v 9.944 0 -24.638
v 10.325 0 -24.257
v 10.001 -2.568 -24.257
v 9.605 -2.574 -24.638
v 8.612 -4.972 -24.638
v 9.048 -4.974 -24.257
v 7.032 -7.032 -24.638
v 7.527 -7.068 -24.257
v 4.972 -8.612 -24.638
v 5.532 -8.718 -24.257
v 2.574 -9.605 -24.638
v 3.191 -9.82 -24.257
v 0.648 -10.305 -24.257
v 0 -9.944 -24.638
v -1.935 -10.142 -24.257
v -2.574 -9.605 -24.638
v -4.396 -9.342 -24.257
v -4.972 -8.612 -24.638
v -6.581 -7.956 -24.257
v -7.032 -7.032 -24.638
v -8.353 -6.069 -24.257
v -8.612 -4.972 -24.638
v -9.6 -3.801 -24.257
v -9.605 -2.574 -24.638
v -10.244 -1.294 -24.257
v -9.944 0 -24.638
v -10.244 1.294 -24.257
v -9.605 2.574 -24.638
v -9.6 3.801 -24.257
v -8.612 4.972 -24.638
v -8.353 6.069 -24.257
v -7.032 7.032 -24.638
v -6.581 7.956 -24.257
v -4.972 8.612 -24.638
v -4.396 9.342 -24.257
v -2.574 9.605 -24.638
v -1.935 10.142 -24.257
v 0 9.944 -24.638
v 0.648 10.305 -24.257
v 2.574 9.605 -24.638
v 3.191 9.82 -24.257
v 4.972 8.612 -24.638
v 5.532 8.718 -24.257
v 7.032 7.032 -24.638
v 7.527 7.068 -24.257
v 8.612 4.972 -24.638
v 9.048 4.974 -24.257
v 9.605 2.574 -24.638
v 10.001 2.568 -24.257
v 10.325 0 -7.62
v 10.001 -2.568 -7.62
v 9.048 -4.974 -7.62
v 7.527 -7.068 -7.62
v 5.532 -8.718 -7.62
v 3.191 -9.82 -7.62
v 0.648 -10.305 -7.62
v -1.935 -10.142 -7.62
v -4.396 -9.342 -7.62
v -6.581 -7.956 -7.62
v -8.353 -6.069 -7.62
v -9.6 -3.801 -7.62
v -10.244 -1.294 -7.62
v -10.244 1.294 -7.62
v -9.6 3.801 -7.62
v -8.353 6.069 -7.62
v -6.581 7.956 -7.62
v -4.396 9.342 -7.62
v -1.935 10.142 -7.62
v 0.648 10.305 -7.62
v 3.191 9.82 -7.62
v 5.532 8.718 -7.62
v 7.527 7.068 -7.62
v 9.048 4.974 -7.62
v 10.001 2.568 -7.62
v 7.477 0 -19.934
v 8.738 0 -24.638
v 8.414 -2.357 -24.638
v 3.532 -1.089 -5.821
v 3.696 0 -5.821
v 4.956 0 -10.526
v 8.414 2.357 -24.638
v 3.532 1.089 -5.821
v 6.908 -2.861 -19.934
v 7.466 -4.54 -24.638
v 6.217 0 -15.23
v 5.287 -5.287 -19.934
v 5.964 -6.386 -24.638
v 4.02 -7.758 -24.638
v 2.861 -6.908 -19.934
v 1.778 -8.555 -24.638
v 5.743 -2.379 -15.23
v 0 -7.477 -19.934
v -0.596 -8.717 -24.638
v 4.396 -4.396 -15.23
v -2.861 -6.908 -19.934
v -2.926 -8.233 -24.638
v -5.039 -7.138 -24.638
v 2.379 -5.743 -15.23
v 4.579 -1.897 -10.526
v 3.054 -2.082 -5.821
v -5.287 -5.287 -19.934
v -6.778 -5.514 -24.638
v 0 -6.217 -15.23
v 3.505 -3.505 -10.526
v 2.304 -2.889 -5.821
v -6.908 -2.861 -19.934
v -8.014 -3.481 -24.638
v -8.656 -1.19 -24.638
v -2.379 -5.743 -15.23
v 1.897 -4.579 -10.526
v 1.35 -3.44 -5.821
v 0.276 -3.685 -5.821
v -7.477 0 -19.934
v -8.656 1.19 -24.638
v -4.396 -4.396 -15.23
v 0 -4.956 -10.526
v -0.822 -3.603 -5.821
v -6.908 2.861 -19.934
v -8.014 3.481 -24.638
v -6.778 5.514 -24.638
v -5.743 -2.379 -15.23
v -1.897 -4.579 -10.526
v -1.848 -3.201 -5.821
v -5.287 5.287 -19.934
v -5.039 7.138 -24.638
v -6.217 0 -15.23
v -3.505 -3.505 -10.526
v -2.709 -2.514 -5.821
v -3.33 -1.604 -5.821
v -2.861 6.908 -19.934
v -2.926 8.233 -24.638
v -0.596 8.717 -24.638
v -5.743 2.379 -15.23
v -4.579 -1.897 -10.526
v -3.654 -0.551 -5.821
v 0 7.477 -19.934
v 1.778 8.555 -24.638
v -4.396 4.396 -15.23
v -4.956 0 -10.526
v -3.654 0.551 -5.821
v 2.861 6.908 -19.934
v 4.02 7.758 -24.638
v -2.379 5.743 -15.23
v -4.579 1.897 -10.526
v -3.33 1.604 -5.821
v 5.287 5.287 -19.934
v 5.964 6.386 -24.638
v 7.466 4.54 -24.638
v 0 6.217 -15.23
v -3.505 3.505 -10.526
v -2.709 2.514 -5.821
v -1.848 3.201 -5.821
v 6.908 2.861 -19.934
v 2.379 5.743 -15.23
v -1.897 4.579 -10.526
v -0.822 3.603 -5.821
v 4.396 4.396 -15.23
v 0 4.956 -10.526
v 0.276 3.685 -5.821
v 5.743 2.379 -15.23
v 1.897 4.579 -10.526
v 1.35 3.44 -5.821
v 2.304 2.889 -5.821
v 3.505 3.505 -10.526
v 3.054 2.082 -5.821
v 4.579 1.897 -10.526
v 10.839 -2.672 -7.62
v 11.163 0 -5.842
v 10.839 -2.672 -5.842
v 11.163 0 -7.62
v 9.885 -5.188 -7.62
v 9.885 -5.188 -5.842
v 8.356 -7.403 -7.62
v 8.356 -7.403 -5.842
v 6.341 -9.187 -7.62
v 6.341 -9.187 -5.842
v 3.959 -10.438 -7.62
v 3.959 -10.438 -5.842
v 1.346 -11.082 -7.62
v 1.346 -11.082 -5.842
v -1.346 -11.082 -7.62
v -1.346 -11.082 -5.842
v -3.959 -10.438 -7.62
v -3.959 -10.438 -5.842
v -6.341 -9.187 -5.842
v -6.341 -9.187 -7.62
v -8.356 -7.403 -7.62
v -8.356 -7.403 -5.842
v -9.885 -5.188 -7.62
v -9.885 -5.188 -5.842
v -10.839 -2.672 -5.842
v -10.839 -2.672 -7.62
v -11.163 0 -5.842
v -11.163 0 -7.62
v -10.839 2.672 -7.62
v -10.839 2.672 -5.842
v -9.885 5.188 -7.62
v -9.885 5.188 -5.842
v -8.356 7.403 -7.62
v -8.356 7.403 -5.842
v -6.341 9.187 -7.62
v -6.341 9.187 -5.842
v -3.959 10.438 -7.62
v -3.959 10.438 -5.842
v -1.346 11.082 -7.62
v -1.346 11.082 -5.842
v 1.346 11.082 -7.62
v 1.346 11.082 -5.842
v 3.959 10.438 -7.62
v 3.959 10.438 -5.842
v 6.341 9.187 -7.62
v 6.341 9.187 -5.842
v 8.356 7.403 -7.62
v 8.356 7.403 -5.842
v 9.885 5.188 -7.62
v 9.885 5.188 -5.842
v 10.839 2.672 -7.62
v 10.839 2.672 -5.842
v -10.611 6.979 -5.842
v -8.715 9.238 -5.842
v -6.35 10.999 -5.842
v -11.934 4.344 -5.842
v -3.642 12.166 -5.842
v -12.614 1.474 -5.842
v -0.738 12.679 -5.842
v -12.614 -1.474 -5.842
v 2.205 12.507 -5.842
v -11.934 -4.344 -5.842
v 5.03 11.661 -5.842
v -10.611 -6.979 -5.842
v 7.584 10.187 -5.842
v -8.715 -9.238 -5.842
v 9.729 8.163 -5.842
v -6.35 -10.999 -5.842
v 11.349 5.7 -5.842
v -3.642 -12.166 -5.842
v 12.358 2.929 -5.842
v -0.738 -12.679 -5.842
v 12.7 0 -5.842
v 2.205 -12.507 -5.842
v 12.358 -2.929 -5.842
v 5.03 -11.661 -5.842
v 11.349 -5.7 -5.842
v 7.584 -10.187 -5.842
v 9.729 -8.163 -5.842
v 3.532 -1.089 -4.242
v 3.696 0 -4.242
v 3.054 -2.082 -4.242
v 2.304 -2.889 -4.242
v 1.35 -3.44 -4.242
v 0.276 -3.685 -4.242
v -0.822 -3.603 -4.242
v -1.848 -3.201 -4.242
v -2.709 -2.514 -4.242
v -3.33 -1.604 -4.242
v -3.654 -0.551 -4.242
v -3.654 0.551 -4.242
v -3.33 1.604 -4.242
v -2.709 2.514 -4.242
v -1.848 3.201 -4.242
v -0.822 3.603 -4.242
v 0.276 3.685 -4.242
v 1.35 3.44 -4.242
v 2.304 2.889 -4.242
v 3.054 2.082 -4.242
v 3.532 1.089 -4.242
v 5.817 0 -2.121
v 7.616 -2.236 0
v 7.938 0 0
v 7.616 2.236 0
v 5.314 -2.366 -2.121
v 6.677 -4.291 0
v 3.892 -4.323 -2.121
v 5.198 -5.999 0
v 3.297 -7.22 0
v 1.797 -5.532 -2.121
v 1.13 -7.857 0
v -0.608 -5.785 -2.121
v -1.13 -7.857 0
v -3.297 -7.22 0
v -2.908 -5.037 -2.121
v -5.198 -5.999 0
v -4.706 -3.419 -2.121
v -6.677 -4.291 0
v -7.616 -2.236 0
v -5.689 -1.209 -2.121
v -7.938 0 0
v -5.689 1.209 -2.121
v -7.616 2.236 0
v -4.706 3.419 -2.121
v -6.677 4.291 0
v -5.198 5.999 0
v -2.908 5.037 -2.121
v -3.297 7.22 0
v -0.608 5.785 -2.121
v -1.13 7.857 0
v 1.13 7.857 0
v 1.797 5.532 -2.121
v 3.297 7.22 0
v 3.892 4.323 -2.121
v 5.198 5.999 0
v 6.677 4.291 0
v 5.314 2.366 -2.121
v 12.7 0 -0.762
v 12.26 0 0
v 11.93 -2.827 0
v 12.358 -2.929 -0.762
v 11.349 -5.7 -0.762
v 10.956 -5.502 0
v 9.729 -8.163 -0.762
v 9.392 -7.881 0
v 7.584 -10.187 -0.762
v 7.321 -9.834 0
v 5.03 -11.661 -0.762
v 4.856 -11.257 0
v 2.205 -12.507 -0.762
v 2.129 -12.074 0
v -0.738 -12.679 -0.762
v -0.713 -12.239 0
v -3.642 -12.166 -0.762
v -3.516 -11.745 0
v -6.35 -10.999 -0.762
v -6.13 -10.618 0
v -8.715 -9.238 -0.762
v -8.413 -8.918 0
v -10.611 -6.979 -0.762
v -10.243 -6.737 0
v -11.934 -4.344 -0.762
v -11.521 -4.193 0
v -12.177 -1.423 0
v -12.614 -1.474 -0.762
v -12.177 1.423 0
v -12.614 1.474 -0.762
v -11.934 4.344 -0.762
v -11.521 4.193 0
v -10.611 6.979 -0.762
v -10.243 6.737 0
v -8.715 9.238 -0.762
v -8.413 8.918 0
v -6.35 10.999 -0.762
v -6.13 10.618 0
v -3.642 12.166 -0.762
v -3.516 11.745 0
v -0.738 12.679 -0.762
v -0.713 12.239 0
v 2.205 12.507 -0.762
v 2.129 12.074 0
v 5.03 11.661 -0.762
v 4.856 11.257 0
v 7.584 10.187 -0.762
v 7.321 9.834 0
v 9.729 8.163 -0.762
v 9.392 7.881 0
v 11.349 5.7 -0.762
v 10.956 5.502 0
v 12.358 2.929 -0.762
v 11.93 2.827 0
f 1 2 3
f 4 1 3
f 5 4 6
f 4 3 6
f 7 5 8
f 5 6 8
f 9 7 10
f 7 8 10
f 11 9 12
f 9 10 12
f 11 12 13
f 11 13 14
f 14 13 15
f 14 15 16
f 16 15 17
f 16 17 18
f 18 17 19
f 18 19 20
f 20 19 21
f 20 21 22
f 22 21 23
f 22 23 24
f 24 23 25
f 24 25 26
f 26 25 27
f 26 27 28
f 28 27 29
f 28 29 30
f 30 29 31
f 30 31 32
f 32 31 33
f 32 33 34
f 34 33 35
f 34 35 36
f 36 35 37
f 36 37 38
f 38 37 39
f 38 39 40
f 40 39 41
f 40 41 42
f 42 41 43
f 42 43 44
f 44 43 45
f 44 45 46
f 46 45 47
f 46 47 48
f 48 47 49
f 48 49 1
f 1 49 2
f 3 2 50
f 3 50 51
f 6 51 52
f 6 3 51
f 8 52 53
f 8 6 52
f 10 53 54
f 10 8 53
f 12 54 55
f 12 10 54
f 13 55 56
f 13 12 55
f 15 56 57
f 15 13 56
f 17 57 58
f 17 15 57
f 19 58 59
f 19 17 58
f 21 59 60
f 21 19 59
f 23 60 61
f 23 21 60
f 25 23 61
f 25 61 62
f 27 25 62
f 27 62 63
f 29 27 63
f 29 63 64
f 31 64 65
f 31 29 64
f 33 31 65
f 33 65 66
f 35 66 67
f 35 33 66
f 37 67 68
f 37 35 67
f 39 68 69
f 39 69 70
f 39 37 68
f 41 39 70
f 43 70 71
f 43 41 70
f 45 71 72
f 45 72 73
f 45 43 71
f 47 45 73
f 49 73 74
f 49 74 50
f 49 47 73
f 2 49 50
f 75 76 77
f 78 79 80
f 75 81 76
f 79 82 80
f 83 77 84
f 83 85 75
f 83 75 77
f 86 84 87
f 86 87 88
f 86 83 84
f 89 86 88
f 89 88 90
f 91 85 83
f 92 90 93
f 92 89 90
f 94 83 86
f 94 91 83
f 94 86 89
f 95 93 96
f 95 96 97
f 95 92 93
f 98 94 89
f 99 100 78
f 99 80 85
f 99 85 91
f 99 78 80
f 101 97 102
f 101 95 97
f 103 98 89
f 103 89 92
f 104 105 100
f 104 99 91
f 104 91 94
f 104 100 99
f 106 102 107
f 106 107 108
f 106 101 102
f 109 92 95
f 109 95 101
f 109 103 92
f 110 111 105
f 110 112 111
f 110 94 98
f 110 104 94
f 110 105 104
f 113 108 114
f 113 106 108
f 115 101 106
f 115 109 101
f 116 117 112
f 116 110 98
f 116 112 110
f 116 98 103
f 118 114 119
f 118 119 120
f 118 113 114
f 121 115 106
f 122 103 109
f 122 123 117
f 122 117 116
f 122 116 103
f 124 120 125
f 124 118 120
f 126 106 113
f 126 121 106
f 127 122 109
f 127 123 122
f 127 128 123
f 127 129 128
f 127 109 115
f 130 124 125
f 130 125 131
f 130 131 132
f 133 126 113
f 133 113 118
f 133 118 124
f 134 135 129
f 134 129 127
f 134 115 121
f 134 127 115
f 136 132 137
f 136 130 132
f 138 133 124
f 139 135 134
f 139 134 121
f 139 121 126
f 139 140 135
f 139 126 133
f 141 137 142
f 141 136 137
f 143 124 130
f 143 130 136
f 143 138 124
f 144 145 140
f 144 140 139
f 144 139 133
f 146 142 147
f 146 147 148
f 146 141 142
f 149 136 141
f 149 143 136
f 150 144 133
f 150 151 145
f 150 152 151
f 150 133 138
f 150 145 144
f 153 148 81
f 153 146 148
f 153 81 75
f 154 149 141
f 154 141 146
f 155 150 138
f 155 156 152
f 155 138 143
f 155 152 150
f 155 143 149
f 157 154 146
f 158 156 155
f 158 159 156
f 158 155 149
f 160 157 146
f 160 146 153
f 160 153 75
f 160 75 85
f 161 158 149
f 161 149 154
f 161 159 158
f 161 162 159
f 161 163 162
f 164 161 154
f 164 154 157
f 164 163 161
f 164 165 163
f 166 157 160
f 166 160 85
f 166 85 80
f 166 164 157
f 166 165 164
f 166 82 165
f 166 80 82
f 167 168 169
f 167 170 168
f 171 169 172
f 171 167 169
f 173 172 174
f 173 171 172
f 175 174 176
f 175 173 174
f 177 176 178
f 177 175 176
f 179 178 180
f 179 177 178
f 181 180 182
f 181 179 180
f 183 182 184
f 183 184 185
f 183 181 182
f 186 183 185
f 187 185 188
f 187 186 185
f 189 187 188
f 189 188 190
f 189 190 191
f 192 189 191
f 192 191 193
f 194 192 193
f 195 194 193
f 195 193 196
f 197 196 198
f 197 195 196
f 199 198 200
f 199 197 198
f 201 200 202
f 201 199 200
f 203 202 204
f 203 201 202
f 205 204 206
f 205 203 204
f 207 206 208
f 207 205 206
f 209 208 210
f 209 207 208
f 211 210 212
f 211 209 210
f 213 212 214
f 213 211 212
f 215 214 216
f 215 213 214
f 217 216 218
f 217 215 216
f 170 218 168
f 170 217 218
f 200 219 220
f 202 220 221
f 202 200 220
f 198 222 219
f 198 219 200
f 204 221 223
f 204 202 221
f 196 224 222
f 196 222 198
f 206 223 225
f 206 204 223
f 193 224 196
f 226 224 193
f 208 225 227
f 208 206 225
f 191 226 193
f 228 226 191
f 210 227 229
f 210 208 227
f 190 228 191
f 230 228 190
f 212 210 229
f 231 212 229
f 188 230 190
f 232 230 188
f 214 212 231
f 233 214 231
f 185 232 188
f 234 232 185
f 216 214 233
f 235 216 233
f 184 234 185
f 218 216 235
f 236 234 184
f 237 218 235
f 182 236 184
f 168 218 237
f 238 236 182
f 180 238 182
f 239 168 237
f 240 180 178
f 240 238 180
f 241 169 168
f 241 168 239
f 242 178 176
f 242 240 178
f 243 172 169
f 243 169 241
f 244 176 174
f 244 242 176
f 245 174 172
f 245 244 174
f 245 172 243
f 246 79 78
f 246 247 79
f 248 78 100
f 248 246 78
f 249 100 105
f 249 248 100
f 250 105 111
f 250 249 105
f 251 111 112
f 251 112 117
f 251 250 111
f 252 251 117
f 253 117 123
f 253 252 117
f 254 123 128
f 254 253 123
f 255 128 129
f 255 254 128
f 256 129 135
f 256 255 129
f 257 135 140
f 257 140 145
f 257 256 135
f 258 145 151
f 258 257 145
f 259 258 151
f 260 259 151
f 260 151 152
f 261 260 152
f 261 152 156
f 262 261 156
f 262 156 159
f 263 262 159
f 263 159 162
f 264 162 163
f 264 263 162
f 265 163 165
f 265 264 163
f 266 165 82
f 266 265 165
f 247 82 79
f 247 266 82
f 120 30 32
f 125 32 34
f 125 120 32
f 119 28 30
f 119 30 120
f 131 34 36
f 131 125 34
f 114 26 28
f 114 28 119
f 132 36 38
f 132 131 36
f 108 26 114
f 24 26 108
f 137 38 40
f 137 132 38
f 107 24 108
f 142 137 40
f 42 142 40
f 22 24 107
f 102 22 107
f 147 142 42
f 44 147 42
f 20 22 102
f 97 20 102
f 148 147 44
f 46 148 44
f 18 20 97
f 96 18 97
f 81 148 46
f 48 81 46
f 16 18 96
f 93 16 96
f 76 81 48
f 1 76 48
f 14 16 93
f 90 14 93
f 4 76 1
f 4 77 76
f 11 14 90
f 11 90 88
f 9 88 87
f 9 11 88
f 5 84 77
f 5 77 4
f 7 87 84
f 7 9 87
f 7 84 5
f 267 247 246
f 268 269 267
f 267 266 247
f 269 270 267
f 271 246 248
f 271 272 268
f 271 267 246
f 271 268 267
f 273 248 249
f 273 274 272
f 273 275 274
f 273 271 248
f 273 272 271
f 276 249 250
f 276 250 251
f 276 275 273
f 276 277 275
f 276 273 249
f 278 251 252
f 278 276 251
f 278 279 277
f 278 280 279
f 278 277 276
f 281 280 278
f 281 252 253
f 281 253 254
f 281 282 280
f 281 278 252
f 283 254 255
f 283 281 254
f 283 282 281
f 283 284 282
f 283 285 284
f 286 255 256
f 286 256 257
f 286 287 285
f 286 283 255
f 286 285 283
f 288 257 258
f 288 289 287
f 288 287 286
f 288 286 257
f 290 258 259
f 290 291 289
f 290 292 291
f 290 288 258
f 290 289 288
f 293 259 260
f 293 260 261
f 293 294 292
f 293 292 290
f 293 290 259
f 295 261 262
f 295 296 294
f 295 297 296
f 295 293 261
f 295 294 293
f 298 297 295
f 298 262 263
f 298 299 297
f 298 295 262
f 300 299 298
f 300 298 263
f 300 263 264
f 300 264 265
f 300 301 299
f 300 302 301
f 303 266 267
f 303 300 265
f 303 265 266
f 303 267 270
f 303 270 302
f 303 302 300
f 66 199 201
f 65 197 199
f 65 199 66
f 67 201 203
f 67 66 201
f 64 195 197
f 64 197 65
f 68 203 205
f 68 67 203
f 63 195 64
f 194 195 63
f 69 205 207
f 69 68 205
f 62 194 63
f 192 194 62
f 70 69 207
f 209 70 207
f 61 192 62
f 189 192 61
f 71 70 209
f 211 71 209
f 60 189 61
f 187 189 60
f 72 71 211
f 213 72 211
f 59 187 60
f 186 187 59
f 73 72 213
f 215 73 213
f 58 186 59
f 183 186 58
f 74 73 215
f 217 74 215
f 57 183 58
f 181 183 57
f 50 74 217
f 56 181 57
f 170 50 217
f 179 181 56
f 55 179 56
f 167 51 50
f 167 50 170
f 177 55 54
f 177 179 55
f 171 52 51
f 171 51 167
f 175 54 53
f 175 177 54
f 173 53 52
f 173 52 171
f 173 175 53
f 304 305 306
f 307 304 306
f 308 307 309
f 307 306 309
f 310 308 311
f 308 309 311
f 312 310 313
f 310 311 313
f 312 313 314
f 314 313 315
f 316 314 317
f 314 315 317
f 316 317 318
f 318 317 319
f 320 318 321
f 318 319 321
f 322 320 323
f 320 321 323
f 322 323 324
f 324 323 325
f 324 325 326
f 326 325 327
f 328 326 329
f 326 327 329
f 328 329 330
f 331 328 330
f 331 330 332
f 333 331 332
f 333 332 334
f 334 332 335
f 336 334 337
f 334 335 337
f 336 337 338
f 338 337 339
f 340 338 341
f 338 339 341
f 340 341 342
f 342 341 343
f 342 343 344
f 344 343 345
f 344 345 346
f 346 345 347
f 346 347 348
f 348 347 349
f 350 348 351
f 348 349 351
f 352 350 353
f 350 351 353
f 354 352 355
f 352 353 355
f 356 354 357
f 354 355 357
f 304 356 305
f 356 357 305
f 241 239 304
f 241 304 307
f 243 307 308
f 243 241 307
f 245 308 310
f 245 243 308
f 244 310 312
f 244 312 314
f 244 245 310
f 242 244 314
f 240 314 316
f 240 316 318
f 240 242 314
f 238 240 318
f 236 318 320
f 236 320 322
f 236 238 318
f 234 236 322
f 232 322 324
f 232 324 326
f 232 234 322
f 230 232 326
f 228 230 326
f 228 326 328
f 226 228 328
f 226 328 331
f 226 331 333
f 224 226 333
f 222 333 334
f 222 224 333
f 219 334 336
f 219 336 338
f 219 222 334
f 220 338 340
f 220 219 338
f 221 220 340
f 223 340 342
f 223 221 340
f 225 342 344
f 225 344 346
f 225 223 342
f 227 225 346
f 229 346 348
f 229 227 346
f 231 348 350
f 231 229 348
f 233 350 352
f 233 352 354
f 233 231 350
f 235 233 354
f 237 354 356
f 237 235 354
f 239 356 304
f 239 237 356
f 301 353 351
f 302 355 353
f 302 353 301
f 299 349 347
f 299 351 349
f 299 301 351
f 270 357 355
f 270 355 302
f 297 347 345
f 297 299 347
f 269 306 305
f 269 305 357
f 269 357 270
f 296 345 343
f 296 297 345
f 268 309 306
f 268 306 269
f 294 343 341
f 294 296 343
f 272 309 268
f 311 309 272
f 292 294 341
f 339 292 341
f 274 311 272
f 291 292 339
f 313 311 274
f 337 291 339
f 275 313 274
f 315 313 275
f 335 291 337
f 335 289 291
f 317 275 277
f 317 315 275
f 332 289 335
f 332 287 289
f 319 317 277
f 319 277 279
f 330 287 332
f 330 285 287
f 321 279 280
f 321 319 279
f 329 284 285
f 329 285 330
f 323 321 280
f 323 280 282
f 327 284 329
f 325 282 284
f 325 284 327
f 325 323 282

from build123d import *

# Parameters (mm, degrees)
CHAMFER1_SIZE  = 0.762
CHAMFER1_SIZE2 = 0.439940905
CHAMFER2_SIZE  = 0.381


with BuildPart() as part:
    # Sketch1 → Revolve1 (revolve)
    with BuildSketch(Plane(origin=(0, 0, 0), x_dir=(0, 0, -1), z_dir=(1, 0, 0)), mode=Mode.PRIVATE) as revolve1_sk:
        Polygon((24.638, -10.3251), (24.638, -8.7376), (5.821373033, -3.6957), (4.2418, -3.6957), (0, -7.9375), (0, -12.7), (5.842, -12.7), (5.842, -11.1633), (7.62, -11.1633), (7.62, -10.3251), align=None)
    revolve(revolve1_sk.sketch.rotate(Axis((0, 0, -6.716573557), (0, 0, -1)), 270), axis=Axis((0, 0, -6.716573557), (0, 0, -1)))

    # Chamfer1
    chamfer1_edges = [part.edges().sort_by_distance(p)[0] for p in [
        (-12.7, 0, 0),
    ]]
    chamfer1_side = [part.faces().sort_by_distance(p)[0] for p in [
        (-12.7, 0, -2.921),
    ]]
    chamfer(chamfer1_edges, length=CHAMFER1_SIZE, length2=CHAMFER1_SIZE2, reference=chamfer1_side[0])

    # Chamfer2
    chamfer2_edges = [part.edges().sort_by_distance(p)[0] for p in [
        (-10.3251, 0, -24.638),
    ]]
    chamfer(chamfer2_edges, length=CHAMFER2_SIZE)


solid = part.part
